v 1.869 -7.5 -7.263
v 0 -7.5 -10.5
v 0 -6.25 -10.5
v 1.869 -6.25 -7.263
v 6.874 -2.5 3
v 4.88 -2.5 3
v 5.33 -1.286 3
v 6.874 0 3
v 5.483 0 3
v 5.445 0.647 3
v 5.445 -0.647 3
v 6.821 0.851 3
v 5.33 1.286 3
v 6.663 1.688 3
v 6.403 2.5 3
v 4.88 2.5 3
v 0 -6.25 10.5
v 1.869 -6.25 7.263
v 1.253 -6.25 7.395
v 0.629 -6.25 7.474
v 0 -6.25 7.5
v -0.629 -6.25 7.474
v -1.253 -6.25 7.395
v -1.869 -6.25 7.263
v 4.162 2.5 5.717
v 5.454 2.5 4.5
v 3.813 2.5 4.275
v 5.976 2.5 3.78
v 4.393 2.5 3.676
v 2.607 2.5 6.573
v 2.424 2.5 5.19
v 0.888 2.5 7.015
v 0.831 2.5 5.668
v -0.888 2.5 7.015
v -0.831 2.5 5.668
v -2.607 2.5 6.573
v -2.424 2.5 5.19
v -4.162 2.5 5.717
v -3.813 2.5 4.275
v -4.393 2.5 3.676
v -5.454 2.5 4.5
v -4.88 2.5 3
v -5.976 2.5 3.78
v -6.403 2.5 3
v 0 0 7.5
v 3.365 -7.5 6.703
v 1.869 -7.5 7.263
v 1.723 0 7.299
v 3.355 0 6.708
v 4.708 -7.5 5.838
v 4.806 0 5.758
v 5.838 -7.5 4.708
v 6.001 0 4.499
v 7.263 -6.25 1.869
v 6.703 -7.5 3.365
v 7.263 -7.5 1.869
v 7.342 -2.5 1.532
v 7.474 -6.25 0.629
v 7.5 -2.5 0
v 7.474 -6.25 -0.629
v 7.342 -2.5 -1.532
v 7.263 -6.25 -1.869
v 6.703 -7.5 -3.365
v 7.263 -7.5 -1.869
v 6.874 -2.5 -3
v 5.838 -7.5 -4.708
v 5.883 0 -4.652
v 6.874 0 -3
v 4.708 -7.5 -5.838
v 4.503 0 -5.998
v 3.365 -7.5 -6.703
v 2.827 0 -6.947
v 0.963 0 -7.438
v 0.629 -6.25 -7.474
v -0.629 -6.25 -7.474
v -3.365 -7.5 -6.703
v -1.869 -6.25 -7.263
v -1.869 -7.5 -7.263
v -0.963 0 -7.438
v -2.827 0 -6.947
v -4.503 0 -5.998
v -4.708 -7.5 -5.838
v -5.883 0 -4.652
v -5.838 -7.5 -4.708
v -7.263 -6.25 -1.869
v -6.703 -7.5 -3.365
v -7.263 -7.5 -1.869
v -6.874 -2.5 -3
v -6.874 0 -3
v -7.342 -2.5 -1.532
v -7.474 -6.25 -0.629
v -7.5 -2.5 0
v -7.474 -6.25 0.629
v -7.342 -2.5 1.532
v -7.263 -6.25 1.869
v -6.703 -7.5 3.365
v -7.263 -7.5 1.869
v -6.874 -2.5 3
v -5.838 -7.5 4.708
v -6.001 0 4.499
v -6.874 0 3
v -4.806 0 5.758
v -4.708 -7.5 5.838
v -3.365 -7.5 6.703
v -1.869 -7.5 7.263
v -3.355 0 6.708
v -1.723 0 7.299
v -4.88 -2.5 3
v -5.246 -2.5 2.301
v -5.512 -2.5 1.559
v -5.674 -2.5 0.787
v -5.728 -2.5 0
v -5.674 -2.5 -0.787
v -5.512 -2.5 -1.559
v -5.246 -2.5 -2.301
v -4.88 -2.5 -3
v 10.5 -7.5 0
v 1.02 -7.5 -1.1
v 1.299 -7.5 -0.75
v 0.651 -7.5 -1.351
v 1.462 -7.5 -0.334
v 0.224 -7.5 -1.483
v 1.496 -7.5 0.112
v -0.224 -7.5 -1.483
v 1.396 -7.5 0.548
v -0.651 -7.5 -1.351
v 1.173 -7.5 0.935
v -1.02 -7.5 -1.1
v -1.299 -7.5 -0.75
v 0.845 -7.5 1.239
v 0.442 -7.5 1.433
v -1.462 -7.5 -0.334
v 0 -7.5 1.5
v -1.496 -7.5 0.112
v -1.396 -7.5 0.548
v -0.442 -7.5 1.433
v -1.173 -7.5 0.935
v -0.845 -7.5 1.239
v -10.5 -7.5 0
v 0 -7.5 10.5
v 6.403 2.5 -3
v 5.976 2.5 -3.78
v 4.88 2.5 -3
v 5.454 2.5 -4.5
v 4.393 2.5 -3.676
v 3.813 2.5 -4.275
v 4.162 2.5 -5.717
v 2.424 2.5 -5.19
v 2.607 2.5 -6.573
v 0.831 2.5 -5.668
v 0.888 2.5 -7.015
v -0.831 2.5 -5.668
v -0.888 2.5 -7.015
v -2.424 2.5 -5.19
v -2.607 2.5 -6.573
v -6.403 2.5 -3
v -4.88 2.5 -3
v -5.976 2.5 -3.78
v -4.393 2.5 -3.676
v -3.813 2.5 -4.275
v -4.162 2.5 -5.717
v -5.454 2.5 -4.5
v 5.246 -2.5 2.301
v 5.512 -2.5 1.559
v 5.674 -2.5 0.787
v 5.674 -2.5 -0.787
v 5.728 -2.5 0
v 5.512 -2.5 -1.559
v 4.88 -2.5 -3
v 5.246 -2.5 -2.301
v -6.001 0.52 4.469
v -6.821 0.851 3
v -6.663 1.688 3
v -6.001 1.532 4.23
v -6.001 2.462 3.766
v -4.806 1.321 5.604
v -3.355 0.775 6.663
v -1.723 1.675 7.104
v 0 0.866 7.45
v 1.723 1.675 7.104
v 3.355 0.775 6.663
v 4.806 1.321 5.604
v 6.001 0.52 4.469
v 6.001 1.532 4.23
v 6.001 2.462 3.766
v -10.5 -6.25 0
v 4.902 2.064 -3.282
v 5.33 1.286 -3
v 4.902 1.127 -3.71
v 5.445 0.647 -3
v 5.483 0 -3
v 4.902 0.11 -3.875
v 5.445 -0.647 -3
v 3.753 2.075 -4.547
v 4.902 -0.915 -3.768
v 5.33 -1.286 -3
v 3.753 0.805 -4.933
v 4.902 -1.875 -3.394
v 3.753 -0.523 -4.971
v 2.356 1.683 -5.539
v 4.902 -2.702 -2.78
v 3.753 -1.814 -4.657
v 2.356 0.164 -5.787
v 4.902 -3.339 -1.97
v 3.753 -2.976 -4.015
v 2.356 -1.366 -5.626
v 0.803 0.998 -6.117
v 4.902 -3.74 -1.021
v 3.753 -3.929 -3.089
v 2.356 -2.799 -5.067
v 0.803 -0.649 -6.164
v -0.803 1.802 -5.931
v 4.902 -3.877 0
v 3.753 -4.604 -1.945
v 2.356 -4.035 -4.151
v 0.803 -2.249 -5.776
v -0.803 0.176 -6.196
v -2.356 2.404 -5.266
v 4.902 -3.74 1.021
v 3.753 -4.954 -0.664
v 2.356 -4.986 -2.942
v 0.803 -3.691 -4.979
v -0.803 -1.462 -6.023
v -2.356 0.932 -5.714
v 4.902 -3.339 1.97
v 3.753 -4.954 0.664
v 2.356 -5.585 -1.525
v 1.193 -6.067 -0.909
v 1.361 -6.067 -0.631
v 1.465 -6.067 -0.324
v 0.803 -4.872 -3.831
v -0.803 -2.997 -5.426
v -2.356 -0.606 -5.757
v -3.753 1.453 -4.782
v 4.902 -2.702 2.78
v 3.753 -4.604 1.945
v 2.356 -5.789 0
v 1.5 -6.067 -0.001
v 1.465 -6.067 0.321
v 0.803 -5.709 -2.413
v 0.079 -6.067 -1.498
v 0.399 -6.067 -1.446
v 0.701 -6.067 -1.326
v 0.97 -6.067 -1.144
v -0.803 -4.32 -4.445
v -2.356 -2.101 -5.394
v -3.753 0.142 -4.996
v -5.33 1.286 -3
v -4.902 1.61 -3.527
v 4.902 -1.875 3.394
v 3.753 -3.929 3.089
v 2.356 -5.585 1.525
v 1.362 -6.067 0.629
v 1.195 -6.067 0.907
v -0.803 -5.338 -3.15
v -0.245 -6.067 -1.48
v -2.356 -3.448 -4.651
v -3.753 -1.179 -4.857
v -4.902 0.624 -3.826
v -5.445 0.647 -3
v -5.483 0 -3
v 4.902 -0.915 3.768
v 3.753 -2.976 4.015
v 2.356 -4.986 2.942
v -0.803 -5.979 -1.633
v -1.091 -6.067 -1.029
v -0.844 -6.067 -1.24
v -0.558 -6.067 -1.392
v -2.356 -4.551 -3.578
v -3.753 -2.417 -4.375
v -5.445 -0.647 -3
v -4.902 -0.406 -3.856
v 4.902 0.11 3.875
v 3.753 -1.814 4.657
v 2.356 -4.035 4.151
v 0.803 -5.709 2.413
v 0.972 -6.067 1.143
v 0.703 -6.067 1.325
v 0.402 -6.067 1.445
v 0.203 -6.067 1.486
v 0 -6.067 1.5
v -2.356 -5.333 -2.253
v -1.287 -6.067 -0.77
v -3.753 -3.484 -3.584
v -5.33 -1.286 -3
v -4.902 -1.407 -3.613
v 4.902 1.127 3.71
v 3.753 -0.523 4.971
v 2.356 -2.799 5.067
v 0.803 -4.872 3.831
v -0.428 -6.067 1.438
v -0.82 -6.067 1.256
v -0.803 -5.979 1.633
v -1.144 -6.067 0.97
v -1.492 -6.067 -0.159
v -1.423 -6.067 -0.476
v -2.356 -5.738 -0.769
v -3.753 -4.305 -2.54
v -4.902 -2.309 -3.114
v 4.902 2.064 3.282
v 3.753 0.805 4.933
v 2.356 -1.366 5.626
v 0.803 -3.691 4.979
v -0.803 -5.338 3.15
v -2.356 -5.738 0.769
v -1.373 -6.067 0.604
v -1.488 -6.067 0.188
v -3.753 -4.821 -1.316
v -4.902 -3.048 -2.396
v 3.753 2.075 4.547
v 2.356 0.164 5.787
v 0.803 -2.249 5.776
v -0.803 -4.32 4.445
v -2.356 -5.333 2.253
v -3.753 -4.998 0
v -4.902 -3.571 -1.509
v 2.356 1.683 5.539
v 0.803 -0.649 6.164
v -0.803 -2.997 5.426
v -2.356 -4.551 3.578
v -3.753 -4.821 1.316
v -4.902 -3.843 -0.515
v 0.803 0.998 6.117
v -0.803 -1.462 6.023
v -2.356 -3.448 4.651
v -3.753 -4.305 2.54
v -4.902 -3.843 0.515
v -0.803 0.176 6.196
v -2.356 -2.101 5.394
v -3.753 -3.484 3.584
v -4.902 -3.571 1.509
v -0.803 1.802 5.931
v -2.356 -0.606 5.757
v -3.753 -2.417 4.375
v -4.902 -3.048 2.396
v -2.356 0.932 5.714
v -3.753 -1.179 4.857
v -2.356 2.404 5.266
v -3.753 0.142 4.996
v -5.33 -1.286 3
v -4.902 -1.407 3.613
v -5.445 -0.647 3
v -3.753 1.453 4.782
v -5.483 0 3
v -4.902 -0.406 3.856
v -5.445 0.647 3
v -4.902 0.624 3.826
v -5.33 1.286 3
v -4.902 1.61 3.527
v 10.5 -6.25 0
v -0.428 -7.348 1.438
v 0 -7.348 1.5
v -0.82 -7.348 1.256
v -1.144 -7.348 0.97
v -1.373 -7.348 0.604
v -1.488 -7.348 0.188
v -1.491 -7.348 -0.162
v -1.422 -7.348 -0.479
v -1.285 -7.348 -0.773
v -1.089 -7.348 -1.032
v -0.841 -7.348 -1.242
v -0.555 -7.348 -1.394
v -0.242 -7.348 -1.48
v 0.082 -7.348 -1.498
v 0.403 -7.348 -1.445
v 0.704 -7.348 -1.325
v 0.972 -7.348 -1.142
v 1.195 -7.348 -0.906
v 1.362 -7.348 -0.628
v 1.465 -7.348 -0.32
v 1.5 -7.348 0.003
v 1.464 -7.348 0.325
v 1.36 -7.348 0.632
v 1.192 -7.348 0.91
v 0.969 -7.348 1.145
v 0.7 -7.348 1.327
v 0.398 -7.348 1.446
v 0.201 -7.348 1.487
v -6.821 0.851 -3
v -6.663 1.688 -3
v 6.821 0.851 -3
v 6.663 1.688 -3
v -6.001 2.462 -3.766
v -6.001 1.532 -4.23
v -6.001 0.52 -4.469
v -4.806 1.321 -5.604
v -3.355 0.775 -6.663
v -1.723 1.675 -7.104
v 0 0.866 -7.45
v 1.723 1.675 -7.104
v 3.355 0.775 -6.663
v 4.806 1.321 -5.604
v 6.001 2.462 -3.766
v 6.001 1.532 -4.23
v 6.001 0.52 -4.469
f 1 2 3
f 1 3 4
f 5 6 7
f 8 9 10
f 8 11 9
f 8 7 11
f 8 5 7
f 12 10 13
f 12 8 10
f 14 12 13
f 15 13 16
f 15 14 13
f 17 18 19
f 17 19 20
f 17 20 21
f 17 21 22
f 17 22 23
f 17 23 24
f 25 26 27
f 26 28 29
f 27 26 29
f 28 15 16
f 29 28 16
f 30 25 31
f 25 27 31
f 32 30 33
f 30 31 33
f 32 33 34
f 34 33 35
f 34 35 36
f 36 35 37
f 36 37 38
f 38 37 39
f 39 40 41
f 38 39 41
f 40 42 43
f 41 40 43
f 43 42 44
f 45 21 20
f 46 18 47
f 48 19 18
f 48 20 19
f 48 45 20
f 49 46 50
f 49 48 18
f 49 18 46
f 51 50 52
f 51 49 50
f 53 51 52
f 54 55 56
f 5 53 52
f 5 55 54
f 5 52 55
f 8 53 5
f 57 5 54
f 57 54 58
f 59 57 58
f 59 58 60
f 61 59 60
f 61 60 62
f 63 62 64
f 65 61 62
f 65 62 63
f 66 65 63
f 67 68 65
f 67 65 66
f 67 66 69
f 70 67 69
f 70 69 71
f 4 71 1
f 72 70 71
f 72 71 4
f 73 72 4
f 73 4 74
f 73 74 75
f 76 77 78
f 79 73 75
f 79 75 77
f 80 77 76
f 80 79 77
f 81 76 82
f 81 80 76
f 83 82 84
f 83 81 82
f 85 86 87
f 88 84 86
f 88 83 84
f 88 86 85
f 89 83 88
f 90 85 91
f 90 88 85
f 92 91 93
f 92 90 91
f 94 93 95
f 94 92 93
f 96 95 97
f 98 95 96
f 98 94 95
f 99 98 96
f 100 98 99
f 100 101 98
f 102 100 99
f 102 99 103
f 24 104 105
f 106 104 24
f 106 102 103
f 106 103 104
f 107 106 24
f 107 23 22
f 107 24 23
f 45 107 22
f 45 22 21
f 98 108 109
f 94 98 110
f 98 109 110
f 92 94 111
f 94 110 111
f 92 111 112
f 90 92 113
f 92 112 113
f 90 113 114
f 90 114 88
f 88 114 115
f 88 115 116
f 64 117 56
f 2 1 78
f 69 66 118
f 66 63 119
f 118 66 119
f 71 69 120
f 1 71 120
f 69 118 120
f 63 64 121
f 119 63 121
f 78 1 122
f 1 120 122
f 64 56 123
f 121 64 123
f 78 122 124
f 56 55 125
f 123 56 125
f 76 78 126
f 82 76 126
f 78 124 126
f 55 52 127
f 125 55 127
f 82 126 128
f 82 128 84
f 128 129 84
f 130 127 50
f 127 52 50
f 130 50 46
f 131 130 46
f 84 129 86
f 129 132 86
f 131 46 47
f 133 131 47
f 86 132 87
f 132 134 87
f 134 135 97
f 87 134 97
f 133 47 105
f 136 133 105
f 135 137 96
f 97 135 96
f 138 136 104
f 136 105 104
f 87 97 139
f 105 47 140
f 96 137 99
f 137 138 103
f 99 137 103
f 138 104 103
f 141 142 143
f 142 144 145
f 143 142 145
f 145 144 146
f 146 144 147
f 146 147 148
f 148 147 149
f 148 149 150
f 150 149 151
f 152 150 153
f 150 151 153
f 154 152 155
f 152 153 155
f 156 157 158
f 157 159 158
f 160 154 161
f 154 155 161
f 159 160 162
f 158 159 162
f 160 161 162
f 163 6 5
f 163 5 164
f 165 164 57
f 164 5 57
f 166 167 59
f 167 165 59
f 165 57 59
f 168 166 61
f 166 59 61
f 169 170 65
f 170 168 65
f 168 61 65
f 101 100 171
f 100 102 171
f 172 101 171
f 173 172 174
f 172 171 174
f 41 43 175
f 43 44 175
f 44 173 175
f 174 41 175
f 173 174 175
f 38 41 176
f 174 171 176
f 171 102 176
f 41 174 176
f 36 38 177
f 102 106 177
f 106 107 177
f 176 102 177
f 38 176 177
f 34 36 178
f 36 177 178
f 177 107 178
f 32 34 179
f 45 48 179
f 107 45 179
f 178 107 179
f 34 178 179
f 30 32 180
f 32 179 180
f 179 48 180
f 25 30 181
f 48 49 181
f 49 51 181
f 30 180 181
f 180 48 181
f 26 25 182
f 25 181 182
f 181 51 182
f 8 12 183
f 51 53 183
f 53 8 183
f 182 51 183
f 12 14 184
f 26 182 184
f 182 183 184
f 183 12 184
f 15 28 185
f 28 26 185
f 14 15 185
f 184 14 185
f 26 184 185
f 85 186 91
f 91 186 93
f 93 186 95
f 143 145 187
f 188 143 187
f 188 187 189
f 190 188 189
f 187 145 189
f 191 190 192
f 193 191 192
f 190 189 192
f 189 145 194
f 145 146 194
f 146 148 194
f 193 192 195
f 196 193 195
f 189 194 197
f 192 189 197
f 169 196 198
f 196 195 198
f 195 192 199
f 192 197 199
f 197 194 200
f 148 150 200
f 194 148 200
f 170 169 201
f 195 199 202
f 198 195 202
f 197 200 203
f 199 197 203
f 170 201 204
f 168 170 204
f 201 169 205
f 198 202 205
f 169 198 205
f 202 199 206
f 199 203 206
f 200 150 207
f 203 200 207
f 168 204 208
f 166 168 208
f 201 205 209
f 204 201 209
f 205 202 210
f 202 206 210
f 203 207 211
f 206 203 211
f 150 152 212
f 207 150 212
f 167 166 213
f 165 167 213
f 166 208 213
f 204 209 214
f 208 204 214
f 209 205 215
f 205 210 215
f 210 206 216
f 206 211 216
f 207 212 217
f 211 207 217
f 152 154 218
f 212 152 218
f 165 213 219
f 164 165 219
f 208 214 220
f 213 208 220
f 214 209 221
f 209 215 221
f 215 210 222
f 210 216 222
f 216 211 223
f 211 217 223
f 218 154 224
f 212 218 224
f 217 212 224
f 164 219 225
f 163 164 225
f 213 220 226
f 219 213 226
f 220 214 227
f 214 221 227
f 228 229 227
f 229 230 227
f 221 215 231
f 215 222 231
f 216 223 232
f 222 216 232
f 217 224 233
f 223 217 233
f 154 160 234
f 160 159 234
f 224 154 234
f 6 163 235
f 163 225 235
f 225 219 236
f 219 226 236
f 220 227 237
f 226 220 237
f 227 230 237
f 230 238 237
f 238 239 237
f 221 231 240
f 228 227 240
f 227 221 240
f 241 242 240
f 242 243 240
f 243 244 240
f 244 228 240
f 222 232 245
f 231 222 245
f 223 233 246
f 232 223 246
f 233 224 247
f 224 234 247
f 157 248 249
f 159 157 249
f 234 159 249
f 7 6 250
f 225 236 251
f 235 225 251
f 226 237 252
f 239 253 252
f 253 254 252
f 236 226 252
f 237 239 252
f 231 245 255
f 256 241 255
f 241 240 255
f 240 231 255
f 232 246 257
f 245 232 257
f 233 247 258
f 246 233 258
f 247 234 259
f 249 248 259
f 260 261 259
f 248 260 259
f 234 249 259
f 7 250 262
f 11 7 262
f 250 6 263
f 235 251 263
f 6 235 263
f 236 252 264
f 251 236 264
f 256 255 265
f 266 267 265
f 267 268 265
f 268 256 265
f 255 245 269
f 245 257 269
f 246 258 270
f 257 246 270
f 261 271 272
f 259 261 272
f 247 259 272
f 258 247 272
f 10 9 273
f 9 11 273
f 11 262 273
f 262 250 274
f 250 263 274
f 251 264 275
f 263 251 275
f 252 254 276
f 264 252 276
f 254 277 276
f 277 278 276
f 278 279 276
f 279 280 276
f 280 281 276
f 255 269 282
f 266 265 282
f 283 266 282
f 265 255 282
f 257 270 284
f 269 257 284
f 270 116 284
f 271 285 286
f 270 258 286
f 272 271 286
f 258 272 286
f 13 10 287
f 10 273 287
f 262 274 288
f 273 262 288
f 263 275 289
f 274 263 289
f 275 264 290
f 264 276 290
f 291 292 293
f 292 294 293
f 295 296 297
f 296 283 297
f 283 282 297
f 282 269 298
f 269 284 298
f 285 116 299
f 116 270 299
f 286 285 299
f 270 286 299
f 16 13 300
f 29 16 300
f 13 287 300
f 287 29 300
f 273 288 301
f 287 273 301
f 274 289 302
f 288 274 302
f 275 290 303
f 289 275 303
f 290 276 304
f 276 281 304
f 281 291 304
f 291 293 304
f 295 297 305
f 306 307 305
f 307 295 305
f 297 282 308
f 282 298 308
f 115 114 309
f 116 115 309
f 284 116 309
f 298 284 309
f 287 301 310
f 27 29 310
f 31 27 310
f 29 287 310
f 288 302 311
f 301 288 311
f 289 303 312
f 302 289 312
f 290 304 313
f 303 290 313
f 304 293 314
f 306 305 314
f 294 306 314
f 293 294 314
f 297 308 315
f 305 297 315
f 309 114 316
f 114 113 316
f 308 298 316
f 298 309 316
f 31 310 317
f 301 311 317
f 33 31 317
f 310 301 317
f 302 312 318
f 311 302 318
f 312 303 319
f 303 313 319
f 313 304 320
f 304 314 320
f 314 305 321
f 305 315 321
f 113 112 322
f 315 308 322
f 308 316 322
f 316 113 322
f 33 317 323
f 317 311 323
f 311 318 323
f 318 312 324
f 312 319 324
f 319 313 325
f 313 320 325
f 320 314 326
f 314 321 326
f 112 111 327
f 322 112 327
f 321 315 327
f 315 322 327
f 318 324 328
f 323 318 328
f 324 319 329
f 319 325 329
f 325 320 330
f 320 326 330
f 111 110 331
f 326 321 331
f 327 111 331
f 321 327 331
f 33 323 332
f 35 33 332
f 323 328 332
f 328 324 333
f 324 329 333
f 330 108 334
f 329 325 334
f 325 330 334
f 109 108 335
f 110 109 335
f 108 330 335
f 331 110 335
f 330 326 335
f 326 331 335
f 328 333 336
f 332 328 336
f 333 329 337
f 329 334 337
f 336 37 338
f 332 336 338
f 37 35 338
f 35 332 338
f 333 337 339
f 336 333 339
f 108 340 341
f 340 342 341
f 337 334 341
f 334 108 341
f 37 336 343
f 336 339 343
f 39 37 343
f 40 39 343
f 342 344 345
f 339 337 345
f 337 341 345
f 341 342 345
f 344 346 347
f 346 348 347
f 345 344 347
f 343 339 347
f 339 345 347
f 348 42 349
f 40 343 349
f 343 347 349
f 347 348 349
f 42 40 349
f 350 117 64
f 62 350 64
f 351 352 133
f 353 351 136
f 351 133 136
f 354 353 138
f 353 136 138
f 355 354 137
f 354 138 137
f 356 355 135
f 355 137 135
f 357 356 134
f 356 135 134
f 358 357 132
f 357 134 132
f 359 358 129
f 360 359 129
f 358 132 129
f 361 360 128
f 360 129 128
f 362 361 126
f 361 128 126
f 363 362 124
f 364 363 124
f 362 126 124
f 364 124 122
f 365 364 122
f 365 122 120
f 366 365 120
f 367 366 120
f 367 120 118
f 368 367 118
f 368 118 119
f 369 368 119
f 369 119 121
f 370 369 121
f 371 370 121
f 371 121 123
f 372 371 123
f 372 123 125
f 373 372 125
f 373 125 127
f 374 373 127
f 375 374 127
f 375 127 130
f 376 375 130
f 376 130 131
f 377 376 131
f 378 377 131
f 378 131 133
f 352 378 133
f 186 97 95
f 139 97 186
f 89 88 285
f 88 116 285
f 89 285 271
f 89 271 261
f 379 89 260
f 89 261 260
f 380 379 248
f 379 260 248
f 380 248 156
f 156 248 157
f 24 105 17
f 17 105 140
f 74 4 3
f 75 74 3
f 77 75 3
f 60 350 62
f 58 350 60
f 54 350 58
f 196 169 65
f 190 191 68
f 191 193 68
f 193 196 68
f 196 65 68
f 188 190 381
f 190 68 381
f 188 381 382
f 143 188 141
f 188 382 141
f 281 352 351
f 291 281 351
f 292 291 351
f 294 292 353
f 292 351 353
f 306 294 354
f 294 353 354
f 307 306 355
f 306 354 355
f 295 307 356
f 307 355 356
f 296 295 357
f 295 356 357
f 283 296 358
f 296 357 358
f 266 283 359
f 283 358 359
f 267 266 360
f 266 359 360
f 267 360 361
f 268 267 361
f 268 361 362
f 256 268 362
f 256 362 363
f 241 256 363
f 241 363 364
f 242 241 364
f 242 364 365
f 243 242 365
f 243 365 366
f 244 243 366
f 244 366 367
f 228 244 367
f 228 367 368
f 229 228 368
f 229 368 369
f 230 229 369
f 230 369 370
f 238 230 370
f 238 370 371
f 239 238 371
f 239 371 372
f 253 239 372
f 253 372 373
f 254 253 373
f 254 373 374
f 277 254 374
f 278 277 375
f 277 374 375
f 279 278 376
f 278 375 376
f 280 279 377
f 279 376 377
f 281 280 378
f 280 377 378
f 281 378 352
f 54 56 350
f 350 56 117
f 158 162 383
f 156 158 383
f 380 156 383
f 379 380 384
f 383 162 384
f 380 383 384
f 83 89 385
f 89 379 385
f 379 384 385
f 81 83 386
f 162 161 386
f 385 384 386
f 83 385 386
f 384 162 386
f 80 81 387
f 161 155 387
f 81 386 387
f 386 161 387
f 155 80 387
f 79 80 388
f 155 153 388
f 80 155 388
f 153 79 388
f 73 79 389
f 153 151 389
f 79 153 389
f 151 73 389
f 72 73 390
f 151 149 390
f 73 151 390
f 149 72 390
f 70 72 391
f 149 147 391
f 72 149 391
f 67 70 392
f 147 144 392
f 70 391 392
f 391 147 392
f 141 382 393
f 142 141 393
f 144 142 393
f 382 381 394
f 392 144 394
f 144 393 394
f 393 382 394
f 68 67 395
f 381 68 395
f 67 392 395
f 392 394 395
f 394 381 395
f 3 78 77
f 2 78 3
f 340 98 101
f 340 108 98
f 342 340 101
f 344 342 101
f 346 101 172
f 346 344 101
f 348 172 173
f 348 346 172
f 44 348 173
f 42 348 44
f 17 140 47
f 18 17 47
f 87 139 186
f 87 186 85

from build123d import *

# Parameters (mm, degrees)
SKETCH9_R           = 7.5
BOSS_EXTRUDE2_DEPTH = 7.5
SKETCH10_W          = 17.888516884
SKETCH10_H          = 18.524036688
CUT_EXTRUDE2_DEPTH  = 20
SKETCH15_W          = 6
SKETCH15_H          = 5
CUT_EXTRUDE3_DEPTH  = 20
BOSS_EXTRUDE4_DEPTH = 1.25
SKETCH24_R          = 1.5
CUT_EXTRUDE4_DEPTH  = 15
BOSS_EXTRUDE5_DEPTH = 1.25


with BuildPart() as part:
    # Sketch7 → Revolve1 (revolve)
    with BuildSketch(Plane(origin=(0, 0, 0), x_dir=(1, 0, 0), z_dir=(0, 1, 0))):
        with BuildLine():
            Line((7.5, 0), (6.25, 0))
            ThreePointArc((6.25, 0), (0, -6.25), (-6.25, 0))
            Line((-6.25, 0), (-7.5, 0))
            ThreePointArc((-7.5, 0), (0, -7.5), (7.5, 0))
        make_face()
    revolve(axis=Axis((-6.25, 0, 0), (-1, 0, 0)))

    # Sketch10 → Cut-Extrude2 (cut)
    with BuildSketch(Plane(origin=(0, 2.5, 0), x_dir=(-1, 0, 0), z_dir=(0, -1, 0))):
        with Locations((-0.350209641, -0.603260139)):
            Rectangle(SKETCH10_W, SKETCH10_H)
    extrude(amount=-CUT_EXTRUDE2_DEPTH, mode=Mode.SUBTRACT)


with BuildPart() as body_2:
    # Sketch9 → Boss-Extrude2 (new body)
    with BuildSketch(Plane(origin=(0, 0, 0), x_dir=(1, 0, 0), z_dir=(0, 1, 0))):
        with Locations(Location((0, 0, 0), (0, 0, 270))):
            Circle(SKETCH9_R)
    extrude(amount=-BOSS_EXTRUDE2_DEPTH)

    # Sketch12 → Cut-Revolve4 (revolve, cut)
    with BuildSketch(Plane(origin=(0, 0, 0), x_dir=(1, 0, 0), z_dir=(0, 1, 0))):
        with BuildLine():
            Line((-6.75, 0), (6.75, 0))
            ThreePointArc((6.75, 0), (0, 6.75), (-6.75, 0))
        make_face()
    revolve(axis=Axis((-8.960272056, 0, 0), (1, 0, 0)), mode=Mode.SUBTRACT)


with BuildPart() as cut_extrude3_tool:
    # Sketch15 → Cut-Extrude3 (new body)
    with BuildSketch(Plane(origin=(7.5, 0, 0), x_dir=(0, 0, -1), z_dir=(1, 0, 0))):
        Rectangle(SKETCH15_W, SKETCH15_H)
    extrude(amount=-CUT_EXTRUDE3_DEPTH)


with BuildPart() as part_1:
    add(part.part)

    # Cut-Extrude3: cut by cut_extrude3_tool
    add(cut_extrude3_tool.part, mode=Mode.SUBTRACT)


with BuildPart() as body_2_1:
    add(body_2.part)

    # Cut-Extrude3: cut by cut_extrude3_tool
    add(cut_extrude3_tool.part, mode=Mode.SUBTRACT)

    # Sketch23 → Boss-Extrude4 (add)
    with BuildSketch(Plane.XZ.offset(7.5)):
        with BuildLine():
            Line((-10.5, 0), (-7.263493829, -1.868597709))
            ThreePointArc((-7.263493829, -1.868597709), (-7.5, 0), (-7.263493829, 1.868597709))
            Line((-7.263493829, 1.868597709), (-10.5, 0))
        make_face()
    boss_extrude4 = extrude(amount=-BOSS_EXTRUDE4_DEPTH)

    # Mirror1: Boss-Extrude4 across plane
    add(boss_extrude4.mirror(Plane(origin=(0, 0, 0), x_dir=(0, 0, 1), z_dir=(1, 0, 0))))


with BuildPart() as cut_extrude4_tool:
    # Sketch24 → Cut-Extrude4 (new body)
    with BuildSketch(Plane.XZ.offset(7.5)):
        with Locations(Location((0, 0, 0), (0, 0, 90))):
            Circle(SKETCH24_R)
    extrude(amount=-CUT_EXTRUDE4_DEPTH)


with BuildPart() as part_2:
    add(part_1.part)

    # Cut-Extrude4: cut by cut_extrude4_tool
    add(cut_extrude4_tool.part, mode=Mode.SUBTRACT)



with BuildPart() as body_2_2:
    add(body_2_1.part)

    # Cut-Extrude4: cut by cut_extrude4_tool
    add(cut_extrude4_tool.part, mode=Mode.SUBTRACT)


with BuildPart() as part_3:
    add(part_2.part)

    add(body_2_2.part)  # Boss-Extrude5 merges body 2
    # Sketch25 → Boss-Extrude5 (add)
    with BuildSketch(Plane.XZ.offset(7.5)):
        with BuildLine():
            Line((0, 10.5), (1.868597709, 7.263493829))
            ThreePointArc((1.868597709, 7.263493829), (0, 7.5), (-1.868597709, 7.263493829))
            Line((-1.868597709, 7.263493829), (0, 10.5))
        make_face()
    boss_extrude5 = extrude(amount=-BOSS_EXTRUDE5_DEPTH)

    # Mirror2: Boss-Extrude5 across plane
    add(boss_extrude5.mirror(Plane.XY))


solid = part_3.part
